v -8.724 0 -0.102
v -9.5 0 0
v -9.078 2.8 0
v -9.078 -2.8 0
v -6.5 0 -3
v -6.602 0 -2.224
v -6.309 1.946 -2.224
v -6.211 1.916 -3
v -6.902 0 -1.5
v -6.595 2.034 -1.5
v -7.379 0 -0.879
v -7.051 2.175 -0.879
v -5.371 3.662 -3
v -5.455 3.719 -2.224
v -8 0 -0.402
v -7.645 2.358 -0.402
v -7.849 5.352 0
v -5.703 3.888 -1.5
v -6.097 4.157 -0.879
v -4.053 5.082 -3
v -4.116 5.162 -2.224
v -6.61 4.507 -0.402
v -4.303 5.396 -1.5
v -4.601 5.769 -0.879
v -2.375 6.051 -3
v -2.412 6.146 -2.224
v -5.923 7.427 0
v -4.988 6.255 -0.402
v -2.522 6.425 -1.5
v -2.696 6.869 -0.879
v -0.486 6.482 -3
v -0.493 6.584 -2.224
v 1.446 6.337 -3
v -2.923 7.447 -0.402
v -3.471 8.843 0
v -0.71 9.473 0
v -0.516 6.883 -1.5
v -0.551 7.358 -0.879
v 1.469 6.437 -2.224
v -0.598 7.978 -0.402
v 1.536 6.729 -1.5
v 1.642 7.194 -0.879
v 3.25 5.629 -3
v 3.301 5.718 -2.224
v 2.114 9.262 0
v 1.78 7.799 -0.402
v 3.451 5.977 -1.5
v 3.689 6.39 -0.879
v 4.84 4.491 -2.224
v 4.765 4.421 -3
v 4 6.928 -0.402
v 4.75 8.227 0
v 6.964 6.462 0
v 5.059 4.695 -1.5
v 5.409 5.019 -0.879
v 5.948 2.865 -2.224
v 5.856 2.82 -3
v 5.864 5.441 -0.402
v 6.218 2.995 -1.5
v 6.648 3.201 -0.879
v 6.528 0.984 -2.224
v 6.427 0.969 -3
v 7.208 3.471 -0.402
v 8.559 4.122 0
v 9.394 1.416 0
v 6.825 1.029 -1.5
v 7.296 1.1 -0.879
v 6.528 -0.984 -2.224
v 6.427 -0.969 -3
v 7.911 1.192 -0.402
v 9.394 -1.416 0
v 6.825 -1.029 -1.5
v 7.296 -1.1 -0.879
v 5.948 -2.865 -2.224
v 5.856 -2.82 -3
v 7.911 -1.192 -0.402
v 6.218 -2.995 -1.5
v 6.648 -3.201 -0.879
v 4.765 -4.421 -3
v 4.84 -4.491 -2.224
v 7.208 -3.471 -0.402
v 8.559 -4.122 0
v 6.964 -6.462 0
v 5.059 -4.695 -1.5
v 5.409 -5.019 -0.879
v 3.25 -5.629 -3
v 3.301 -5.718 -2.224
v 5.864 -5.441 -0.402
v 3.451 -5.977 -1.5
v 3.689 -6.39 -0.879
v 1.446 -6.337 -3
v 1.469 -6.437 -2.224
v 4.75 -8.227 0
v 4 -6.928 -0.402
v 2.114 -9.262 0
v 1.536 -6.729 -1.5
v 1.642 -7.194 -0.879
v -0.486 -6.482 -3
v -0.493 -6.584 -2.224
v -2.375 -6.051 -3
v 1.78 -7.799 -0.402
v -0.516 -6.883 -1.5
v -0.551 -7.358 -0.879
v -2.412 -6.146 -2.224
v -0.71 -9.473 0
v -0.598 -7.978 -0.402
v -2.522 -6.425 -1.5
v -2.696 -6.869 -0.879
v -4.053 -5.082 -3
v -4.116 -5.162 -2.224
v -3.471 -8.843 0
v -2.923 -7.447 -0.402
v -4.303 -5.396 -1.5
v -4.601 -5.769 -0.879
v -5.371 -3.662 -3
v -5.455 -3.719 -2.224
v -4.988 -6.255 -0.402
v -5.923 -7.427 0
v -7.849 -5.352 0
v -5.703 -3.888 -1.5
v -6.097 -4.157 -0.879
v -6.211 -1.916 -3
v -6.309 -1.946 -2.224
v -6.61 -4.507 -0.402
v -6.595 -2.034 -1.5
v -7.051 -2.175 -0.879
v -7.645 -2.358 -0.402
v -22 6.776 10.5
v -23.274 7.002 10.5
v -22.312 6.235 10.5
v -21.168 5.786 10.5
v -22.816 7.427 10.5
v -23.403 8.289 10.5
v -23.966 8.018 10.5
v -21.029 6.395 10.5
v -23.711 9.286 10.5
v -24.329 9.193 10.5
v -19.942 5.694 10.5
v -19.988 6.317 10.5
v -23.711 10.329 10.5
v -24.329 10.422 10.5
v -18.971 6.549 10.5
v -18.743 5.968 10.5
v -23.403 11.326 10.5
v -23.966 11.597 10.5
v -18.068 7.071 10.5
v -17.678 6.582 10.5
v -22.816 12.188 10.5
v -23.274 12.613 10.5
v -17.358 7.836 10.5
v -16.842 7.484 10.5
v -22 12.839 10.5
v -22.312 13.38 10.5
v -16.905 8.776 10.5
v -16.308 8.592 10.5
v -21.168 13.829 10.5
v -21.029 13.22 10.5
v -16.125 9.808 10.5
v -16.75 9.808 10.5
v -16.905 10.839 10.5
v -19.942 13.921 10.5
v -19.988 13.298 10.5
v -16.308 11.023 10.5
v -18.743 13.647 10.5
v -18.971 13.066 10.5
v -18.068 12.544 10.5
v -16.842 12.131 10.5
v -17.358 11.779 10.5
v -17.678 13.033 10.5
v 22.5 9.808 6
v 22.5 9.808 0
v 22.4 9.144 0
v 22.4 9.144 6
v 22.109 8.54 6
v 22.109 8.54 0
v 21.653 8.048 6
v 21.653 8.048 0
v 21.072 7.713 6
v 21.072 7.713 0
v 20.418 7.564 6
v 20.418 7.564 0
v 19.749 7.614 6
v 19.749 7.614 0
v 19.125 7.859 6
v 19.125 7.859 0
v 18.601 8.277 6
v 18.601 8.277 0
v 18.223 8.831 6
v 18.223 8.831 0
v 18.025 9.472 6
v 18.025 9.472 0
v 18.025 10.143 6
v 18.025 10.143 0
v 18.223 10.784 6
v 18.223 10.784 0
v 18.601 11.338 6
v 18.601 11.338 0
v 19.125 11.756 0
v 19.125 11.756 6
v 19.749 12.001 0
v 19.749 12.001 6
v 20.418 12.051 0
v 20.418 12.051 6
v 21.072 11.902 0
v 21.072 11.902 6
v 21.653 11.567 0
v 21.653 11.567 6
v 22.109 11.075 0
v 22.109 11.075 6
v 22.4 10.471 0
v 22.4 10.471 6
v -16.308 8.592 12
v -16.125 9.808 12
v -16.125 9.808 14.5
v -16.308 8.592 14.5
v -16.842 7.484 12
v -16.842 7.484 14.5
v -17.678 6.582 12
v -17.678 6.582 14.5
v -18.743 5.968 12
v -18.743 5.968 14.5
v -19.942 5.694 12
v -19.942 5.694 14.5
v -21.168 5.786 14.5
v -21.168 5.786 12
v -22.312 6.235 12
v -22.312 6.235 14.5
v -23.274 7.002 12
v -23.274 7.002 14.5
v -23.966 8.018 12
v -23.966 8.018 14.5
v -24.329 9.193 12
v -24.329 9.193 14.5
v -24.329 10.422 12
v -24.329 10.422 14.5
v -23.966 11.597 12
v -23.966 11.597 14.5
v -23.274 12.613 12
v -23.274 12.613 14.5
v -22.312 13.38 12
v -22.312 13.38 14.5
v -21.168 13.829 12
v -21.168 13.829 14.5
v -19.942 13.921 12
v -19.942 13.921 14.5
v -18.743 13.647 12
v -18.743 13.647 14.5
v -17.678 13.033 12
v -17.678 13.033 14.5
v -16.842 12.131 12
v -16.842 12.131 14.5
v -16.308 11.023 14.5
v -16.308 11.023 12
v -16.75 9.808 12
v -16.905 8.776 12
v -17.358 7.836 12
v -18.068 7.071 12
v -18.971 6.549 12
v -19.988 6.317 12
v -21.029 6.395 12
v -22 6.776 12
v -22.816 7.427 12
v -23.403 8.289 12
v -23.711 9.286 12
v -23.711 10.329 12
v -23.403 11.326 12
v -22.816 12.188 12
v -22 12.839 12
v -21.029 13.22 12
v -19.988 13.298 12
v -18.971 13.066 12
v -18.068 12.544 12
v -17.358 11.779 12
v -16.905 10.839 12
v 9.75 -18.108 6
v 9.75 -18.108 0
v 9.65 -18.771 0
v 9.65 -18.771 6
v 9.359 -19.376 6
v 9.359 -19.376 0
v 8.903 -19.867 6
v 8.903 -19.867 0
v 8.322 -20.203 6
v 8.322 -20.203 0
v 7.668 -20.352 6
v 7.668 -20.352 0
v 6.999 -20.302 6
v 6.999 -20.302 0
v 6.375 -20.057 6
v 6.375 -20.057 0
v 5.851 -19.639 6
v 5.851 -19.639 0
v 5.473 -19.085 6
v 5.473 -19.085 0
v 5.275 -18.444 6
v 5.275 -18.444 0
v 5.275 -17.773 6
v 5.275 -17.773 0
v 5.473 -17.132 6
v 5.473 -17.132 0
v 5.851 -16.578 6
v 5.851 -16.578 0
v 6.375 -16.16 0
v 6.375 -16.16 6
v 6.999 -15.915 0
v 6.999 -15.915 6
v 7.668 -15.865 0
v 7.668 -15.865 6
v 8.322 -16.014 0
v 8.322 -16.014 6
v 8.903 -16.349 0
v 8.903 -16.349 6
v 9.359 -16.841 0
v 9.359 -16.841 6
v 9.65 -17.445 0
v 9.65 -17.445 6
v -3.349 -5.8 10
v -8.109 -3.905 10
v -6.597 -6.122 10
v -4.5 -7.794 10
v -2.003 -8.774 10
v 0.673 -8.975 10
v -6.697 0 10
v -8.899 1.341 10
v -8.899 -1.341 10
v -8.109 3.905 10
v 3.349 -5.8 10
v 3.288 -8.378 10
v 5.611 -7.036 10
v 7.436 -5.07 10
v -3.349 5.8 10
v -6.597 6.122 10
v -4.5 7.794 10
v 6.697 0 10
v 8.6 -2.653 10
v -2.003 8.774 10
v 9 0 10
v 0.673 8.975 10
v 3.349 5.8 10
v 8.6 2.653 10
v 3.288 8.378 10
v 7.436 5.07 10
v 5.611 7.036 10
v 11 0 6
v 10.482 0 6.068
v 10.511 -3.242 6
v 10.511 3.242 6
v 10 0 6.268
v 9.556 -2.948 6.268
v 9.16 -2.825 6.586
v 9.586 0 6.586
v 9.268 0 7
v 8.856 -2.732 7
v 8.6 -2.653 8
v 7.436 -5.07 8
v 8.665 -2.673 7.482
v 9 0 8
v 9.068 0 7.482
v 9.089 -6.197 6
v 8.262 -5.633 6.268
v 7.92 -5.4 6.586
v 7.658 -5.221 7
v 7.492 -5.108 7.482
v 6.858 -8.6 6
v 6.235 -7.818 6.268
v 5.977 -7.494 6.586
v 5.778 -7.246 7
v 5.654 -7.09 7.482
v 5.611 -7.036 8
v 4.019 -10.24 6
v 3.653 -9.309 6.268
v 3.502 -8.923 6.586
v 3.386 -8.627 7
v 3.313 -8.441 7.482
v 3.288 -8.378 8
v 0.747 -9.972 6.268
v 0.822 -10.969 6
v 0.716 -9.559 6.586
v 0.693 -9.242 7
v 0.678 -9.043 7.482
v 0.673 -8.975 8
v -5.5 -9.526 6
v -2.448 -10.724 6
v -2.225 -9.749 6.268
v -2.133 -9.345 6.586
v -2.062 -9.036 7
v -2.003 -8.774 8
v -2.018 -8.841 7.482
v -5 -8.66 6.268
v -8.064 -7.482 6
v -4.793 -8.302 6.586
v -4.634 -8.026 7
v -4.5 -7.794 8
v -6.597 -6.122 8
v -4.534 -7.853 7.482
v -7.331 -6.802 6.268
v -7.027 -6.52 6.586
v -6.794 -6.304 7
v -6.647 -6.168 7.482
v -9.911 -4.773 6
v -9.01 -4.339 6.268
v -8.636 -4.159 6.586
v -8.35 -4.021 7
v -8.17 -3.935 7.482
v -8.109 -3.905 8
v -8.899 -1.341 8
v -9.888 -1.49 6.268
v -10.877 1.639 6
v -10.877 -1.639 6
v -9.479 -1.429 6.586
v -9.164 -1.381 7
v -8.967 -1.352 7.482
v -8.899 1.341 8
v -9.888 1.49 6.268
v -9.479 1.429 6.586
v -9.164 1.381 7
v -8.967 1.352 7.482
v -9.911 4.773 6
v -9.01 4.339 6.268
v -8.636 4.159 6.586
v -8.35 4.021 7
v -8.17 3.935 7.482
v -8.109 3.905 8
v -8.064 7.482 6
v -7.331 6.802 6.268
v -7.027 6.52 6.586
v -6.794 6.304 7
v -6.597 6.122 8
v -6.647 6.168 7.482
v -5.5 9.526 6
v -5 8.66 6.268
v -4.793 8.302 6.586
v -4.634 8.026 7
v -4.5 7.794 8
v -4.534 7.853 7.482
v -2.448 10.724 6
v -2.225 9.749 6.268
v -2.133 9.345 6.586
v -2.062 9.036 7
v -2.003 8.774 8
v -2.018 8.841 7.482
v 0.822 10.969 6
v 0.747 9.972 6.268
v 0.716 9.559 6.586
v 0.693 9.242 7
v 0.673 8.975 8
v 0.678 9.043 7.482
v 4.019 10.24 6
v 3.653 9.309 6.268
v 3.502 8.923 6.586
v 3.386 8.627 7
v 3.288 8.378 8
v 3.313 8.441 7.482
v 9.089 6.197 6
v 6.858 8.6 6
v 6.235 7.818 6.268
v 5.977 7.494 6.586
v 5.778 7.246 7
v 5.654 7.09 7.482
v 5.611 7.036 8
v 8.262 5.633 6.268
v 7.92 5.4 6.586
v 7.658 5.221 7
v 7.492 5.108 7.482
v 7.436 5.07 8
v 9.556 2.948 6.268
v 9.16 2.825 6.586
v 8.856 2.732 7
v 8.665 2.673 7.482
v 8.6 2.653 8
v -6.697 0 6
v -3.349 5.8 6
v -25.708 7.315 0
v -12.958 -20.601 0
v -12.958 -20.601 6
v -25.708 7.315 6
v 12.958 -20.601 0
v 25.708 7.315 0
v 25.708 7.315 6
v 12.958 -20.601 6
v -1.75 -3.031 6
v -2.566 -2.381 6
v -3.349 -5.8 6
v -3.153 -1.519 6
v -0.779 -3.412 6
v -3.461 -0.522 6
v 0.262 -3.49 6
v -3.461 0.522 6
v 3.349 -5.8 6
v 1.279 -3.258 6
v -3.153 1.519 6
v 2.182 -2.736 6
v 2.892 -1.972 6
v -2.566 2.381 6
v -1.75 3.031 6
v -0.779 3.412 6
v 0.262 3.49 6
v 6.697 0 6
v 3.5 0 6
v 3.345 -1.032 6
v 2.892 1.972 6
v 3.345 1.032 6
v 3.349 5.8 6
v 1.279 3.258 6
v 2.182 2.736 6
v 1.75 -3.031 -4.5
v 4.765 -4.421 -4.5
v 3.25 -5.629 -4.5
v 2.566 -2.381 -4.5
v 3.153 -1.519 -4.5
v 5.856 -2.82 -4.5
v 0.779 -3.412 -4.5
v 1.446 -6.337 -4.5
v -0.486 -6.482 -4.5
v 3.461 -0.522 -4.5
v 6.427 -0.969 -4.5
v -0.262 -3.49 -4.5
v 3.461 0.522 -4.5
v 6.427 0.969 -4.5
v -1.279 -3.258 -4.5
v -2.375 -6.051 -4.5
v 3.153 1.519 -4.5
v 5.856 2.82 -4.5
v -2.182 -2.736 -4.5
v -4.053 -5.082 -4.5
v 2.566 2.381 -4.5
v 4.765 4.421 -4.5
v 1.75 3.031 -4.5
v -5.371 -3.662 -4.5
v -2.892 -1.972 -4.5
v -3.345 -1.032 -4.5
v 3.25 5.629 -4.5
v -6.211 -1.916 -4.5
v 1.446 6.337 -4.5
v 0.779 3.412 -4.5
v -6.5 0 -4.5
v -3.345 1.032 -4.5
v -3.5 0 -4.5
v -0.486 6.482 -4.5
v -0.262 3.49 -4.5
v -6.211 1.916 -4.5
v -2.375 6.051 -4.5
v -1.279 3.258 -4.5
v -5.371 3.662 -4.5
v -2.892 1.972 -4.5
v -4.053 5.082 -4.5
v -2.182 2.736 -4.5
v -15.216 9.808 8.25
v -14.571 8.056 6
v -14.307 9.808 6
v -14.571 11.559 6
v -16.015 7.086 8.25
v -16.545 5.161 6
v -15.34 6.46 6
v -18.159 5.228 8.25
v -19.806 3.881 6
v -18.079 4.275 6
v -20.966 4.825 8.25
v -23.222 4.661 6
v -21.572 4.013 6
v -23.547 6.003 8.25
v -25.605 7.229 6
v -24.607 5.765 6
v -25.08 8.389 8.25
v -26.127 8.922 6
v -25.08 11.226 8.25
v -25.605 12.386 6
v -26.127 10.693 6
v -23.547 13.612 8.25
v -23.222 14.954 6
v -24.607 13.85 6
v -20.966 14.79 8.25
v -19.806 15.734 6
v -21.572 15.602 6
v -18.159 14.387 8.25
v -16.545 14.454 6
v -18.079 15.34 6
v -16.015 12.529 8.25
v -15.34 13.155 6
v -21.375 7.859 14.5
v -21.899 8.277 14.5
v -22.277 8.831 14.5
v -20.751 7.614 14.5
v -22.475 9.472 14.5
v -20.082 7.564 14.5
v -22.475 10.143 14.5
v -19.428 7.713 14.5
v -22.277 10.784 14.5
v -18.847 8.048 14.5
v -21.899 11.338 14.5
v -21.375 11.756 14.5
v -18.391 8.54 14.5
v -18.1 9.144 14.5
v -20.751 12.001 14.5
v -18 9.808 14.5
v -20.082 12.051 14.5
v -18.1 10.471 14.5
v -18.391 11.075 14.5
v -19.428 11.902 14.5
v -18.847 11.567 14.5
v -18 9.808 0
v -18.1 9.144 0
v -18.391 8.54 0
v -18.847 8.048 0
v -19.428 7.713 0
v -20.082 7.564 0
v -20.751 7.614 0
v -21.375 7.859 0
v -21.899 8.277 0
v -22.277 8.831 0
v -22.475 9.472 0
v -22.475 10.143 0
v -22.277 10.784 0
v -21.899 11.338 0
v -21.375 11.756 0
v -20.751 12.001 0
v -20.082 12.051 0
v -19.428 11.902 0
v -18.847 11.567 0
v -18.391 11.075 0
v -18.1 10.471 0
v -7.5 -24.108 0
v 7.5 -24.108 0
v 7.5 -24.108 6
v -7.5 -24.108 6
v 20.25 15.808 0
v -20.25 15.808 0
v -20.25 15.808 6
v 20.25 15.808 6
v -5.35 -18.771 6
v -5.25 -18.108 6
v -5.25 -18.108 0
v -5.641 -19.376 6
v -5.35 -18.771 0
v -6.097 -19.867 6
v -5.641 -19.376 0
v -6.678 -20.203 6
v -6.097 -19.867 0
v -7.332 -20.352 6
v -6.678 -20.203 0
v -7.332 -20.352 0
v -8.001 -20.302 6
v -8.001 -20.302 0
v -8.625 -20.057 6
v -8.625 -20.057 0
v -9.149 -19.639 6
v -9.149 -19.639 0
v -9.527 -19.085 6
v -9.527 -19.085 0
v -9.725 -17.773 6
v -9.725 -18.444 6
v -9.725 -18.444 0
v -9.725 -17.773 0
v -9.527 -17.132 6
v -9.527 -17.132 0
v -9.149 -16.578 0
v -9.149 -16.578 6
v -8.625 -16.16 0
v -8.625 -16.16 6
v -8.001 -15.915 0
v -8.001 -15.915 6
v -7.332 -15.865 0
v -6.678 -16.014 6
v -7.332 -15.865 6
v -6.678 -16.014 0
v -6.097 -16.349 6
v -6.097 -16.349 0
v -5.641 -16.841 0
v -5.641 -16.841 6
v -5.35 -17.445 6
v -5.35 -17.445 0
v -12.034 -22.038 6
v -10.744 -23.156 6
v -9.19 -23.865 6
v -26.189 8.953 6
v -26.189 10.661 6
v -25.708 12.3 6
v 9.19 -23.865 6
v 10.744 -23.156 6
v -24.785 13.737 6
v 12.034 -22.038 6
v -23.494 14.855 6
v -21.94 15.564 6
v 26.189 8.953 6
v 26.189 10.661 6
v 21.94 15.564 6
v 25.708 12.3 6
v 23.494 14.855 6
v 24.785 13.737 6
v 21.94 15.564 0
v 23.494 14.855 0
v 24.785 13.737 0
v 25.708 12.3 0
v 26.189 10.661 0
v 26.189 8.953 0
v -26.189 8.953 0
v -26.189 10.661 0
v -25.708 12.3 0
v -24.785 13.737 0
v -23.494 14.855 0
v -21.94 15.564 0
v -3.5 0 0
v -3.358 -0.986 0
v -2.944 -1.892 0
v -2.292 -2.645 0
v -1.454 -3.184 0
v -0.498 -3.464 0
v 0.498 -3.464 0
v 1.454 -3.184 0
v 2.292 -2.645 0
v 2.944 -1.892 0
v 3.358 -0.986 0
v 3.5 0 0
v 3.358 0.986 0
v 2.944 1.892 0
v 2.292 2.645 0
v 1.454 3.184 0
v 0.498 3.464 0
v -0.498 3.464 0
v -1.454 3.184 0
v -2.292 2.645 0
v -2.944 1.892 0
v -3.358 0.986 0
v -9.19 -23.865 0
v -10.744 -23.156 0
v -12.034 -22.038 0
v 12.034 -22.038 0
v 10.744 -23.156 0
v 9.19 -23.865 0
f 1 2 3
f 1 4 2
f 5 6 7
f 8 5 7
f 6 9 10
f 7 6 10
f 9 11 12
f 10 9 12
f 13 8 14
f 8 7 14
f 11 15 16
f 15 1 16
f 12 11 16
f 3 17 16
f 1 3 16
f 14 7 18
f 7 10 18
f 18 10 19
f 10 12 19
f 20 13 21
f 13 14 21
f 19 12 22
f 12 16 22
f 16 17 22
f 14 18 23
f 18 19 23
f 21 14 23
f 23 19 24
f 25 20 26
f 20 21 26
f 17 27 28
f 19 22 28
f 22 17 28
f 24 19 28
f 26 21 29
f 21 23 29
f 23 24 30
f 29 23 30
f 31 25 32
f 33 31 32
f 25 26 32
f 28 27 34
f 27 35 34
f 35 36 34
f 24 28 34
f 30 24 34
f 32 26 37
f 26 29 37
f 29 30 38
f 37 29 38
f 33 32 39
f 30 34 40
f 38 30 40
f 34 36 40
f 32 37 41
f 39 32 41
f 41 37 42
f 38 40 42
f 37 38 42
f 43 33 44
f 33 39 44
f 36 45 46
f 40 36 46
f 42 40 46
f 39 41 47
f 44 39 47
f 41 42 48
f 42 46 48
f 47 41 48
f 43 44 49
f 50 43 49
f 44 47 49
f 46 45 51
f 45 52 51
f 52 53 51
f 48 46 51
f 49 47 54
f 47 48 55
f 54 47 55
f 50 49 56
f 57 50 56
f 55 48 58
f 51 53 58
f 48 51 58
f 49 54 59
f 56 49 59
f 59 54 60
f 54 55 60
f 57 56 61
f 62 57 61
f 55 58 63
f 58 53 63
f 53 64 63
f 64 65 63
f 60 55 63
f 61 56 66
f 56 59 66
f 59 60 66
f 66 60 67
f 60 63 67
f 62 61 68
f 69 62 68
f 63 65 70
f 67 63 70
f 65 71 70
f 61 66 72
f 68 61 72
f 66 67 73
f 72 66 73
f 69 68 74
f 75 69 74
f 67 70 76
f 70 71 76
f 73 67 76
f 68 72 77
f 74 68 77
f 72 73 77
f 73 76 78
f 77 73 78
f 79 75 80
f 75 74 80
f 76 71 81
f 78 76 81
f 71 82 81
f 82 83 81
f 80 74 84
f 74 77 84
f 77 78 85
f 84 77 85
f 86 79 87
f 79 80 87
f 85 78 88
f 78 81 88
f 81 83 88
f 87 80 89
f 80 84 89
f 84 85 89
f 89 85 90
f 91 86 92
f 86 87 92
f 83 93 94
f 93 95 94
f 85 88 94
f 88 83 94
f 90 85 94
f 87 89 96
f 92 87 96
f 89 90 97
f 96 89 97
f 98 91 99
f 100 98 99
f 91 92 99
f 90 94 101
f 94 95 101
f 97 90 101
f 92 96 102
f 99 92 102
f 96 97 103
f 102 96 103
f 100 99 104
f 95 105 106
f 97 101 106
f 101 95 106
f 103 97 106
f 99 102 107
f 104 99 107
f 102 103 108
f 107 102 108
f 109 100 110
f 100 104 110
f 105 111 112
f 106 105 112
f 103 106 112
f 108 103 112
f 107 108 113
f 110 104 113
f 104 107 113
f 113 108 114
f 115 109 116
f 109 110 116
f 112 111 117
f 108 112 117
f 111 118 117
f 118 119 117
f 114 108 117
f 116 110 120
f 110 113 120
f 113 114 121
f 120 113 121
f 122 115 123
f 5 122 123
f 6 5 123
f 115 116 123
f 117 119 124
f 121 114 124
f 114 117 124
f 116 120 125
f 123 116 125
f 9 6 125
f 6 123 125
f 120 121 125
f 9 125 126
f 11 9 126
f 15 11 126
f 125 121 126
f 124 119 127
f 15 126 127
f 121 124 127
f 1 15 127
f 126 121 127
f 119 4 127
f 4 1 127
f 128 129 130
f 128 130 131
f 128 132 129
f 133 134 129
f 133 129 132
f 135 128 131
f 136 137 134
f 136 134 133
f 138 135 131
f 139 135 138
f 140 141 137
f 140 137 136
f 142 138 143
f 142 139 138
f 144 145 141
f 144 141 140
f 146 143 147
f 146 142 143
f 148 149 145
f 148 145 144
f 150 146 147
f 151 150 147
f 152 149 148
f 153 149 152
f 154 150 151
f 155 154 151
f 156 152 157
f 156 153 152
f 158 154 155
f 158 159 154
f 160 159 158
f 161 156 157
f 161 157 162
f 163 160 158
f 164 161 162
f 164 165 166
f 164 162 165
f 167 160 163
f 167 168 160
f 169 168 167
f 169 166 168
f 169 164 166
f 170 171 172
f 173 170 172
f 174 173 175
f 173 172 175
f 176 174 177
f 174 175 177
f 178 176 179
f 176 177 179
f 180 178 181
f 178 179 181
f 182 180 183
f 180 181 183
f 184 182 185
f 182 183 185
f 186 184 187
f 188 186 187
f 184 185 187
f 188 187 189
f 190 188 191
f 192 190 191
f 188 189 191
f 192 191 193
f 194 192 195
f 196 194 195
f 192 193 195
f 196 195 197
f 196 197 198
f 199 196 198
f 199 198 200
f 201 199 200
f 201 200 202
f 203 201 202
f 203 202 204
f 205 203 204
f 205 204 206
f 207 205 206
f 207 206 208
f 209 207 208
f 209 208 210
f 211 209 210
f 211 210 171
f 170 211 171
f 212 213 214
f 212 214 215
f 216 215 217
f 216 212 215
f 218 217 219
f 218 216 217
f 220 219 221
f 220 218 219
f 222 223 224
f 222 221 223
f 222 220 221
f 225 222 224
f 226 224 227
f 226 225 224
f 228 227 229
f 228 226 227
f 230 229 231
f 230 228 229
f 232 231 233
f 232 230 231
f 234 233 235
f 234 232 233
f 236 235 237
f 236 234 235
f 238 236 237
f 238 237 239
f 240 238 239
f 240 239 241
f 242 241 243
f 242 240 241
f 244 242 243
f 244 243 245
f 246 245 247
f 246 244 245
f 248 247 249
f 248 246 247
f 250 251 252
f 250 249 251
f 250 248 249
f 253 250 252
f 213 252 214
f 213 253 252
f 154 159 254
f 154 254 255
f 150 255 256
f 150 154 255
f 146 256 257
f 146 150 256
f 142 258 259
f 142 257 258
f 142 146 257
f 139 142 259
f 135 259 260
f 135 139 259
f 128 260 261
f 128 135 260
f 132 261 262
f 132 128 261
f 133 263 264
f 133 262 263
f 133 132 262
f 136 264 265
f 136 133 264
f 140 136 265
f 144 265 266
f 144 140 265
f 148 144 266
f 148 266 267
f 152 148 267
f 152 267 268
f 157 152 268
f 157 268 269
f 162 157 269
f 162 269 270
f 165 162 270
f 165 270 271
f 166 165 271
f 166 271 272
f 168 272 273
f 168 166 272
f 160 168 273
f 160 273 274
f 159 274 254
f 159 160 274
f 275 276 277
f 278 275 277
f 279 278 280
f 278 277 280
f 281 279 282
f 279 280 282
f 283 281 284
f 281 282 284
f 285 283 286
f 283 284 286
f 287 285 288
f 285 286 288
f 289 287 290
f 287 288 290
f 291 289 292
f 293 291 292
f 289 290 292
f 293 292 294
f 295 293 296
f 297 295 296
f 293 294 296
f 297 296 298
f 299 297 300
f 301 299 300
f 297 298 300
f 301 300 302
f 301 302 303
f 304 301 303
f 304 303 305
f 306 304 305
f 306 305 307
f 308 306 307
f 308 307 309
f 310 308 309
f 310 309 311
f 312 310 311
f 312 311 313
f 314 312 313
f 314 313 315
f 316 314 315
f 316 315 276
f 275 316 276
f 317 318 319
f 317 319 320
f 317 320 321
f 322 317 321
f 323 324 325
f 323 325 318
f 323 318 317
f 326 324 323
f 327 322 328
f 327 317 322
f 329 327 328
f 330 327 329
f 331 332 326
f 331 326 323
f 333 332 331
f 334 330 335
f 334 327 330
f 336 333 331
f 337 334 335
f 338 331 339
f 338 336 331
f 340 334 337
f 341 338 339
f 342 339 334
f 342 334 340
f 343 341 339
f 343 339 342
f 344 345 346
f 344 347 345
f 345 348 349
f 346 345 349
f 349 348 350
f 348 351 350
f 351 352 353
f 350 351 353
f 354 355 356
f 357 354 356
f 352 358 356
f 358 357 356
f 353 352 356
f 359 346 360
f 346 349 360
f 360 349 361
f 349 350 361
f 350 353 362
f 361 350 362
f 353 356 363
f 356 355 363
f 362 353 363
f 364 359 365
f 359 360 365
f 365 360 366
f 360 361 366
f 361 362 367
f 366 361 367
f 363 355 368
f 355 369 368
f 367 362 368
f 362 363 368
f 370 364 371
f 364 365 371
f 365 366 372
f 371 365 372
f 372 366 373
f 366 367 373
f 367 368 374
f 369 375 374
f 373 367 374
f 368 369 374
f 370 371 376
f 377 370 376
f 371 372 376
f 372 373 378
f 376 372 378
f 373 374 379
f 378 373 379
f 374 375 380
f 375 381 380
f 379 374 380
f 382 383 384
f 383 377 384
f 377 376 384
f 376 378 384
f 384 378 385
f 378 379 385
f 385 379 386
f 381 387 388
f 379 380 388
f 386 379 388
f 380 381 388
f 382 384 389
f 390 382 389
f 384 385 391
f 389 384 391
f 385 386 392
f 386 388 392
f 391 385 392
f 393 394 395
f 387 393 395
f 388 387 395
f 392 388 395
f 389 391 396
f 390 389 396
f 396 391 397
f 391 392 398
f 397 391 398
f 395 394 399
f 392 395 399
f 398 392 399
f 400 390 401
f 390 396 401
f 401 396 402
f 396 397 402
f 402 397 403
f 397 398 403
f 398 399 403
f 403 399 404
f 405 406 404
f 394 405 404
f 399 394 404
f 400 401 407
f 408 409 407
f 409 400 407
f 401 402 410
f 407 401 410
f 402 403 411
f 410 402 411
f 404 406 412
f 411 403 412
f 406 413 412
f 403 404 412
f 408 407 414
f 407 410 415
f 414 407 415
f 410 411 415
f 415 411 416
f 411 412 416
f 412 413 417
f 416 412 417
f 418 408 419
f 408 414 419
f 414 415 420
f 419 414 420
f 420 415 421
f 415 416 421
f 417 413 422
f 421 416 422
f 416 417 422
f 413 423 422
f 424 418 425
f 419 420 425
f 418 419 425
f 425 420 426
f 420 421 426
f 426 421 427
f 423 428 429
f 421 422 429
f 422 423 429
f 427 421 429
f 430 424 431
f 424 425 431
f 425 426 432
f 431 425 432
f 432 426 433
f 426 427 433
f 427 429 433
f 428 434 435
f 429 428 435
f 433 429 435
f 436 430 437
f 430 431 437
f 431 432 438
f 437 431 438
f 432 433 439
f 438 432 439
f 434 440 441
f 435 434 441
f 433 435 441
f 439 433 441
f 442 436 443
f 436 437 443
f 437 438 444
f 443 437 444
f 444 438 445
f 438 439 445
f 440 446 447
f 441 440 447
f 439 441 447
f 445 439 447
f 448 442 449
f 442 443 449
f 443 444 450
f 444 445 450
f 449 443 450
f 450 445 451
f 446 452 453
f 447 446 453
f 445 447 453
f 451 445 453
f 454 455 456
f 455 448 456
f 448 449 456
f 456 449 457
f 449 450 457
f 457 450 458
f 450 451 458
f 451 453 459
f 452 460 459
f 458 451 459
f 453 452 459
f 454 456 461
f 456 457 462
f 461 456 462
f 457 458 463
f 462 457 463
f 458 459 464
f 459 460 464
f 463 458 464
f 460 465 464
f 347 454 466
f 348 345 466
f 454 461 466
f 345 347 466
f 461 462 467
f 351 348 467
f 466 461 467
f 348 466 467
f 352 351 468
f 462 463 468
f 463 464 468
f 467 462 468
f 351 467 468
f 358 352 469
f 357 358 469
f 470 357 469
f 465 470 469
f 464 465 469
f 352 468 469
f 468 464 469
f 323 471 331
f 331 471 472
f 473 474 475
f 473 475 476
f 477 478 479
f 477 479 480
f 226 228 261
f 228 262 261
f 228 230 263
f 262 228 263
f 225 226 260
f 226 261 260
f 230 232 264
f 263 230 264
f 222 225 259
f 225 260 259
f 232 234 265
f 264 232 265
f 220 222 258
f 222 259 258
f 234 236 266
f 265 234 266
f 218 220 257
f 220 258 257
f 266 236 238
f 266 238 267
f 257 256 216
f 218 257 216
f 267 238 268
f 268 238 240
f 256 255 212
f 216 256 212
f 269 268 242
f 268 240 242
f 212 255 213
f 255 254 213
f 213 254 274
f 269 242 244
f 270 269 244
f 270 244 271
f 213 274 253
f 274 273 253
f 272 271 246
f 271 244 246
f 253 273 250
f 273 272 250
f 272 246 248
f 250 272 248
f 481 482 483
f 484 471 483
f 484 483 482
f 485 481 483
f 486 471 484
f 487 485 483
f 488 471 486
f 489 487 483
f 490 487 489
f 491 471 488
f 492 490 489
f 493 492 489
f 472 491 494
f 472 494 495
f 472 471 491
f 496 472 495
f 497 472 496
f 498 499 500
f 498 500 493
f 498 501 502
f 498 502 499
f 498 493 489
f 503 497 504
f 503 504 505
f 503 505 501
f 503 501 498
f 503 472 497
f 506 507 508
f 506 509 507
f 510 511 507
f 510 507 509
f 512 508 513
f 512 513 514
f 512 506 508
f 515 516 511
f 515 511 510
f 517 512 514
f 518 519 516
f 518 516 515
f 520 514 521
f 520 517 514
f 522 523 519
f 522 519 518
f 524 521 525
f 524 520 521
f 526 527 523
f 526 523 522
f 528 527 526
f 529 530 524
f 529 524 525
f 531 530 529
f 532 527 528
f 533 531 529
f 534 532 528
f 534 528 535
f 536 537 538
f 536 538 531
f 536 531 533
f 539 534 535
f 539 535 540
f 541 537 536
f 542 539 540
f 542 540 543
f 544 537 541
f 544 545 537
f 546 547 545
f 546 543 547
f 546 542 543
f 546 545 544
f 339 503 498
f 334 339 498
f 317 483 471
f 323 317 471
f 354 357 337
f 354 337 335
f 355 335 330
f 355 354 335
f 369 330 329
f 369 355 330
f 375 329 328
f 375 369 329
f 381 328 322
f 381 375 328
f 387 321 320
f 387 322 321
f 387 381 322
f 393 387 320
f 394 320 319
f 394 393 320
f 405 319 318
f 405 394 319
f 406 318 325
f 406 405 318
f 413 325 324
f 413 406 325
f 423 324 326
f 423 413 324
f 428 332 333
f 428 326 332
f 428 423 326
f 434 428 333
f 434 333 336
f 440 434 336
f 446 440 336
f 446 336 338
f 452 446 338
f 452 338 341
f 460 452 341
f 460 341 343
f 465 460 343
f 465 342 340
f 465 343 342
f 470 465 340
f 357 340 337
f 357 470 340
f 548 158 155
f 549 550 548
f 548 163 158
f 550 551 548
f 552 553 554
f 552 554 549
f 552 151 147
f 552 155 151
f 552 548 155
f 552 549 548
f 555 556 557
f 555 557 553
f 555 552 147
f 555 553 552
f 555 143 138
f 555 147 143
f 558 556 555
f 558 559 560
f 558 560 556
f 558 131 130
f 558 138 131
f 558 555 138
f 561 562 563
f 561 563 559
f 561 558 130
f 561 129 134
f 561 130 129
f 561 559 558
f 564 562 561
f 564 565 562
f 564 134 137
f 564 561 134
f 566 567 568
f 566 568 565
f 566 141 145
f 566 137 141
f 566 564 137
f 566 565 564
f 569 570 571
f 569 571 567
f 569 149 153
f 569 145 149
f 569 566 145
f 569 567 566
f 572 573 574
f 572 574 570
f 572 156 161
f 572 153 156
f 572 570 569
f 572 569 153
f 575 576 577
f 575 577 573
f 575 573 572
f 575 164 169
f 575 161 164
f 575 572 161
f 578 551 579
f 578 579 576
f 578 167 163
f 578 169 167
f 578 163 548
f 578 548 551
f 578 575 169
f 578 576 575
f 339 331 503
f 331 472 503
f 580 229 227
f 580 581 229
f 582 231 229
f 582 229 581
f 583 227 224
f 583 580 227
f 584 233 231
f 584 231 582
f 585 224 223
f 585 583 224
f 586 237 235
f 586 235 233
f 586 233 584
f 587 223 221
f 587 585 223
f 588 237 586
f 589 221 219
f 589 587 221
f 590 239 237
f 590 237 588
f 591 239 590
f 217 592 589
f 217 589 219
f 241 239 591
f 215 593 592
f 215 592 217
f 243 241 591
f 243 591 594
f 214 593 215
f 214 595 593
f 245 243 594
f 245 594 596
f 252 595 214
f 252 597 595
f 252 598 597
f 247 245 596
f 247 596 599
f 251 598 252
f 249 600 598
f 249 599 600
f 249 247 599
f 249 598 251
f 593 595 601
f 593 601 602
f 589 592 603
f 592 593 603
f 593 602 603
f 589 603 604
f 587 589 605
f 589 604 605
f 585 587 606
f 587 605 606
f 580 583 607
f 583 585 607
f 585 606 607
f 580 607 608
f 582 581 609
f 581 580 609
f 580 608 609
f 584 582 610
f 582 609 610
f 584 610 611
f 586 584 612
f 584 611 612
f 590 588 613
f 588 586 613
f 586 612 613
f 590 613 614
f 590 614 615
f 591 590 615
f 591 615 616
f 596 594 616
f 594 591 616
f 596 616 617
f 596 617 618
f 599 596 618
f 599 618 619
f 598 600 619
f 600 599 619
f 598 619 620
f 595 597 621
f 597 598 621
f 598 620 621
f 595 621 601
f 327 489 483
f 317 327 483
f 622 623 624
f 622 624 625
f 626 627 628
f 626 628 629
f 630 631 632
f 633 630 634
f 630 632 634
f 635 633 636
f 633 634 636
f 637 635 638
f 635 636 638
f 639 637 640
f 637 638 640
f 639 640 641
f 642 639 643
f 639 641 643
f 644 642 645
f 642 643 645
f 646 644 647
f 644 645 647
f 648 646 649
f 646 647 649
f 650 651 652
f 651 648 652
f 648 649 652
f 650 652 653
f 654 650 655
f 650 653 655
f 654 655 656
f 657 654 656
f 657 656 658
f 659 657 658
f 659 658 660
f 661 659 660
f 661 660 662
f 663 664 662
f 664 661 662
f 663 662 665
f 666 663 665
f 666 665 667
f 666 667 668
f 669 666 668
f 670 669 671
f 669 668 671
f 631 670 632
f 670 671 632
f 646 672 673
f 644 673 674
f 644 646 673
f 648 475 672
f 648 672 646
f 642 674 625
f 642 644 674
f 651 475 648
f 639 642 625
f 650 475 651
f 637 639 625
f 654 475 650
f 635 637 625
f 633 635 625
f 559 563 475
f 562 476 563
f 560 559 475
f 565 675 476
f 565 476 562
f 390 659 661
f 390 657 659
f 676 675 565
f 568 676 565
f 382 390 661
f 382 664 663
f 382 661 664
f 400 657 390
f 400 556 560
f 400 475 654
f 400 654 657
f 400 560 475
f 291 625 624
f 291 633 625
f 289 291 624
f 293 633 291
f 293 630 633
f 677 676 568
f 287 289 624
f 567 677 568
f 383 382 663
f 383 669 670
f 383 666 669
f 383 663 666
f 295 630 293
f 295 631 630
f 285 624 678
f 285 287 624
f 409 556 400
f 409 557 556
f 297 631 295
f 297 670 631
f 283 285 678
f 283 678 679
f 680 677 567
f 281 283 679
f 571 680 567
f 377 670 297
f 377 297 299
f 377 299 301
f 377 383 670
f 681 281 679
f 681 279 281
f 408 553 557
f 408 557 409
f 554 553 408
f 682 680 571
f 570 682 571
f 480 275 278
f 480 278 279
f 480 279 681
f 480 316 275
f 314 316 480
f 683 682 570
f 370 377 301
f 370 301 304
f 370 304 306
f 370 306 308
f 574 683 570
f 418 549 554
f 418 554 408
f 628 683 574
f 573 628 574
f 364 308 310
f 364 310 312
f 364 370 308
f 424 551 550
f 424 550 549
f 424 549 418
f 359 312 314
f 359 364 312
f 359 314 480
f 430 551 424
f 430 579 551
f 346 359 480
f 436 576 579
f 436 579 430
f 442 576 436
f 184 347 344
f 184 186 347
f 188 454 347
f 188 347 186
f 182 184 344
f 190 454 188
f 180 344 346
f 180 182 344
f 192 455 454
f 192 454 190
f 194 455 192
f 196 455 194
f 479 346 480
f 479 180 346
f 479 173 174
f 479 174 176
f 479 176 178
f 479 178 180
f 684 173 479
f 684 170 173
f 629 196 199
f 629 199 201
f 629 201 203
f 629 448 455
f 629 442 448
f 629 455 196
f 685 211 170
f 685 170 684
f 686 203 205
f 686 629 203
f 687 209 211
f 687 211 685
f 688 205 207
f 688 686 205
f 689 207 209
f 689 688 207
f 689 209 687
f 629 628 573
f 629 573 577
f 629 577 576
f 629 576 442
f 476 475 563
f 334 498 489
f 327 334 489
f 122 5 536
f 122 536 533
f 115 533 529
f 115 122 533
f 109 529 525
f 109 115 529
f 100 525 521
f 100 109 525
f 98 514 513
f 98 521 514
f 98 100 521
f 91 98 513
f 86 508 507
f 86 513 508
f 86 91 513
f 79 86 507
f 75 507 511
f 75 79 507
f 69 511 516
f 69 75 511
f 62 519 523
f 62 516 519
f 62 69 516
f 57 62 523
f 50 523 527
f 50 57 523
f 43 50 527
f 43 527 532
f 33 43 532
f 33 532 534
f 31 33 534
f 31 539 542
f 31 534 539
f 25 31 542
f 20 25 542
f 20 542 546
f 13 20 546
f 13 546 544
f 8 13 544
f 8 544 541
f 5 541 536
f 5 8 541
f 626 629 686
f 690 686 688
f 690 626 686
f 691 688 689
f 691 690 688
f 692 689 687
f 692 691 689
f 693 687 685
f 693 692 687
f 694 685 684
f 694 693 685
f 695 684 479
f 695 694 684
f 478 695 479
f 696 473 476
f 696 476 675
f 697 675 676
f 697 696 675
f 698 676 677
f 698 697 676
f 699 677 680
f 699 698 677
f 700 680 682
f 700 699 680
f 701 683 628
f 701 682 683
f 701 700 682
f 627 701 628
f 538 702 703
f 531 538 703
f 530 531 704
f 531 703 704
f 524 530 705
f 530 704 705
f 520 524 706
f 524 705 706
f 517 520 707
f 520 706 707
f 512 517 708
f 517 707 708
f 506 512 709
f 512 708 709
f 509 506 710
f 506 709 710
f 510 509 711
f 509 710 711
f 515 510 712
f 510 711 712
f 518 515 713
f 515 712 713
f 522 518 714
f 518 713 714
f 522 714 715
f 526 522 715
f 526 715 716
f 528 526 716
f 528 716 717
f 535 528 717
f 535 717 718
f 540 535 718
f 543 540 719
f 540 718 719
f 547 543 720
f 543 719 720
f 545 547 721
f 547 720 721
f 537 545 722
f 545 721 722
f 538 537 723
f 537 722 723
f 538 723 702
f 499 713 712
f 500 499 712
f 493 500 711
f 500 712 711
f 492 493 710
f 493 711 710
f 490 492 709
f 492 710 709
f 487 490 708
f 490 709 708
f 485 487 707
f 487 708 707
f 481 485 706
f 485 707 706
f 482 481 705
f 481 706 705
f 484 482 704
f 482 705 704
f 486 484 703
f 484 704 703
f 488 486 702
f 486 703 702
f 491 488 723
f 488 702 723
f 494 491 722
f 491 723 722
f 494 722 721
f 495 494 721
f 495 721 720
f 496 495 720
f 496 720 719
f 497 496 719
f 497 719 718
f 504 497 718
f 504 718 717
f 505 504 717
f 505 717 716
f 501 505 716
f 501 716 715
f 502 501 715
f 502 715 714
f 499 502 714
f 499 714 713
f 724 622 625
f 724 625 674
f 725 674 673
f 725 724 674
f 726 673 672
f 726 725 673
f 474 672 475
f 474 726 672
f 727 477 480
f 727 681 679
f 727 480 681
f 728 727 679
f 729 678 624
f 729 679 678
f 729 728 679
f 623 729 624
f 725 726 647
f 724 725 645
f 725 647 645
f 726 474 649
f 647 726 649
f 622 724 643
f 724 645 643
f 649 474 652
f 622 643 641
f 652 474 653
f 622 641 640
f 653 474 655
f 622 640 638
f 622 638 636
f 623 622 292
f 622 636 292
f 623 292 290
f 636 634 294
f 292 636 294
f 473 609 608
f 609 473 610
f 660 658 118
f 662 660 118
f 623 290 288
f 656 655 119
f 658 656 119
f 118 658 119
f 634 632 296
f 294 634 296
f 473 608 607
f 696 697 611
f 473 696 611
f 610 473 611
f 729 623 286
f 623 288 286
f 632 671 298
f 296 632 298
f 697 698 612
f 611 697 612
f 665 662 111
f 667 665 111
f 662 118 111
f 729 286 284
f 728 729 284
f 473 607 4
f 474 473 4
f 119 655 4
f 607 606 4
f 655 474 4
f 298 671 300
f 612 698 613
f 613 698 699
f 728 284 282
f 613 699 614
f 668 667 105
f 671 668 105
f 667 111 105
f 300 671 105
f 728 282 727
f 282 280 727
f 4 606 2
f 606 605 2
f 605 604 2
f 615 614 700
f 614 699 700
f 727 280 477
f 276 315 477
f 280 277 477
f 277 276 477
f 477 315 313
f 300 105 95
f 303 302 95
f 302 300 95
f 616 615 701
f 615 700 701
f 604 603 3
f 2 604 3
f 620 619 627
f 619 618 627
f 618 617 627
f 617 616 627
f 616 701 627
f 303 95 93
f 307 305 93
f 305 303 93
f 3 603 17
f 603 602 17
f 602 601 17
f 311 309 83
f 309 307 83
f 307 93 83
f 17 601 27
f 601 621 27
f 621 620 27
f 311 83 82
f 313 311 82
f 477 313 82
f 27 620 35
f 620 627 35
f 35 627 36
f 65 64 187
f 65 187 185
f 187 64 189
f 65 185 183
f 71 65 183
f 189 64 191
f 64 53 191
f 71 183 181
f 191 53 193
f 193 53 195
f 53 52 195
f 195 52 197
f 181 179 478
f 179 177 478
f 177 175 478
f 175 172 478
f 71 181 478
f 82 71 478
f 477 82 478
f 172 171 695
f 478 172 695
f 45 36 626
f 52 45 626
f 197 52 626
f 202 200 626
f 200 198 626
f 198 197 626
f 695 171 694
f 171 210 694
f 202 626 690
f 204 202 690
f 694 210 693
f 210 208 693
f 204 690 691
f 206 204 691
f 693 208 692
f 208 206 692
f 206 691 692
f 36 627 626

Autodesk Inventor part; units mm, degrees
ref_plane "YZ Plane" through (0, 0, 0) normal (1, 0, 0) x (0, 1, 0)
ref_plane "XZ Plane" through (0, 0, 0) normal (0, 1, 0) x (-1, 0, 0)
ref_plane "XY Plane" through (0, 0, 0) normal (0, 0, 1) x (1, 0, 0)
sketch "Sketch1" plane through (0, 0, 0) normal (0, 0, 1) x (1, 0, 0)
  circle A0 centre (0, 0) radius 3.5
  line L0 (0, 0) -> (7.5, 0)
  line L1 (0, 0) -> (-7.5, 0)
  line L2 (7.5, 0) -> (7.5, -18.1083)
  line L3 (-7.5, 0) -> (-7.5, -18.1083)
  circle A1 centre (7.5, -18.1083) radius 2.25
  circle A2 centre (-7.5, -18.1083) radius 2.25
  circle A3 centre (0, 0) radius 22.5
  line L4 (0, 0) -> (20.25, 0)
  line L5 (20.25, 0) -> (20.25, 9.8075)
  line L6 (0, 0) -> (-20.25, 0)
  line L7 (-20.25, 0) -> (-20.25, 9.8075)
  circle A4 centre (20.25, 9.8075) radius 2.25
  circle A5 centre (-20.25, 9.8075) radius 2.25
  line L8 (-20.25, 9.8075) -> (20.25, 9.8075)
  line L9 (20.25, 9.8075) -> (7.5, -18.1083)
  line L10 (7.5, -18.1083) -> (-7.5, -18.1083)
  line L11 (-7.5, -18.1083) -> (-20.25, 9.8075)
  line L12 (-20.25, 15.8075) -> (20.25, 15.8075)
  line L13 (25.7077, 7.3148) -> (12.9577, -20.601)
  line L14 (7.5, -24.1083) -> (-7.5, -24.1083)
  line L15 (-12.9577, -20.601) -> (-25.7077, 7.3148)
  circle A6 centre (-20.25, 9.8075) radius 6
  circle A7 centre (20.25, 9.8075) radius 6
  circle A8 centre (7.5, -18.1083) radius 6
  arc A9 (-13.499, -18.0007) -> (-7.5, -24.1083) centre (-7.5, -18.1083) ccw
  arc A10 (-7.5, -18.1083) -> (7.5, -18.1083) centre (0, 0) ccw
  dimension "d0" = 7
  dimension "d1" = 7.5
  dimension "d2" = 7.5
  dimension "d4" = 4.5
  dimension "d5" = 4.5
  dimension "d6" = 45
  dimension "d7" = 20.25
  dimension "d8" = 20.25
  dimension "d9" = 4.5
  dimension "d10" = 4.5
  dimension "d11" = 6
  dimension "d27" = 12
  dimension "d28" = 6
  dimension "d29" = 12
  dimension "d30" = 12
extrude "Extrusion1" add sketch "Sketch1" along normal blind 6 contours L0 L2 A8 L10 A2 L3 L1 A0 | A0 L1 L6 L11 A6 L8 A7 L9 L4 L0 | L4 L9 A8 L2 | L3 A2 L11 L6 | A8 L9 A1 L2 | L2 A1 L10 A8 | L9 A7 L5 L4 | L4 L5 A7 A3 L13 A8 L9 | L11 A2 A10 A8 A3 L15 A6 L7 L6 | L6 L7 A6 L11 | A8 A3 A10 A1 L9 | A8 A10 A2 L10 | L10 A1 A10 A8 | A7 L8 A4 L9 | L9 A4 L5 A7 | A6 L7 A5 L11 | L11 A5 L8 A6 | A8 A3 | A3 L13 A8 | L5 A4 A3 A7 | A7 A3 A4 L8 | L8 A6 A3 L12 A7 | A6 A3 A5 L7 | L8 A5 A3 A6 | A8 L14 A9 A3 | A7 L13 A3 | A3 A4 A7 | A3 L12 A7 | A6 A3 A5 | A3 L15 A6 | A6 L12 A3 | A9 L15 A3
sketch "Sketch2" plane through (0, 0, 0) normal (0, 0, -1) x (-1, 0, 0)
  circle A0 centre (0, 0) radius 3.5 projected
  circle A1 centre (0, 0) radius 6.5
  circle A2 centre (0, 0) radius 3.5
  dimension "d14" = 13
extrude "Extrusion2" add sketch "Sketch2" along normal blind 4.5
fillet "Fillet1" radius 3 1 edges at (6.5, 0, 0)
sketch "Sketch3" plane through (0, 0, 6) normal (0, 0, 1) x (1, 0, 0)
  circle A0 centre (-20.25, 9.8075) radius 2.25 projected
  arc A1 (-20.25, 15.8075) -> (-25.7077, 7.3148) centre (-20.25, 9.8075) ccw projected
  circle A2 centre (-20.25, 9.8075) radius 4.125
  circle A3 centre (-20.25, 9.8075) radius 2.25
  dimension "d18" = 8.25
  dimension "d36" = 4.5
extrude "Extrusion3" add sketch "Sketch3" along normal blind 4.5
sketch "Sketch4" plane through (-20.25, 9.8075, 10.5) normal (0, 0, 1) x (1, 0, 0)
  circle A0 centre (0, 0) radius 2.25 projected
  circle A1 centre (0, 0) radius 4.125 projected
  circle A2 centre (0, 0) radius 3.5
  circle A3 centre (0, 0) radius 2.25
  point P0 (20.25, -9.8075)
  dimension "d21" = 7
extrude "Extrusion4" add sketch "Sketch4" along normal blind 1.5 contours A2
sketch "Sketch5" plane through (-20.25, 9.8075, 12) normal (0, 0, 1) x (1, 0, 0)
  circle A0 centre (0, 0) radius 2.25 projected
  circle A1 centre (0, 0) radius 3.5 projected
  circle A2 centre (0, 0) radius 4.125
  circle A3 centre (0, 0) radius 2.25
  point P0 (20.25, -9.8075)
  dimension "d24" = 8.25
extrude "Extrusion5" add sketch "Sketch5" along normal blind 2.5 contours A1 | A2
sketch "Sketch6" plane through (0, 0, 6) normal (0, 0, 1) x (1, 0, 0)
  circle A0 centre (0, 0) radius 3.5 projected
  line L0 (6.6973, 0) -> (3.3486, -5.8)
  line L1 (3.3486, -5.8) -> (-3.3486, -5.8)
  line L2 (-3.3486, -5.8) -> (-6.6973, 0)
  line L3 (-6.6973, 0) -> (-3.3486, 5.8)
  line L4 (-3.3486, 5.8) -> (3.3486, 5.8)
  line L5 (3.3486, 5.8) -> (6.6973, 0)
  circle A1 centre (0, 0) radius 9
  dimension "d31" = 11.6
  dimension "d32" = 18
extrude "Extrusion6" add sketch "Sketch6" along normal blind 4 contours A1
fillet "Fillet2" radius 2 1 edges at (-9, 0, 6)
draft "FaceDraft1" angle 22 pull direction (0, 0, 1) faces at (-16.1384, 9.4756, 9) fixed edges at (-24.375, 9.8075, 10.5)
properties part number "hexagon_1"
